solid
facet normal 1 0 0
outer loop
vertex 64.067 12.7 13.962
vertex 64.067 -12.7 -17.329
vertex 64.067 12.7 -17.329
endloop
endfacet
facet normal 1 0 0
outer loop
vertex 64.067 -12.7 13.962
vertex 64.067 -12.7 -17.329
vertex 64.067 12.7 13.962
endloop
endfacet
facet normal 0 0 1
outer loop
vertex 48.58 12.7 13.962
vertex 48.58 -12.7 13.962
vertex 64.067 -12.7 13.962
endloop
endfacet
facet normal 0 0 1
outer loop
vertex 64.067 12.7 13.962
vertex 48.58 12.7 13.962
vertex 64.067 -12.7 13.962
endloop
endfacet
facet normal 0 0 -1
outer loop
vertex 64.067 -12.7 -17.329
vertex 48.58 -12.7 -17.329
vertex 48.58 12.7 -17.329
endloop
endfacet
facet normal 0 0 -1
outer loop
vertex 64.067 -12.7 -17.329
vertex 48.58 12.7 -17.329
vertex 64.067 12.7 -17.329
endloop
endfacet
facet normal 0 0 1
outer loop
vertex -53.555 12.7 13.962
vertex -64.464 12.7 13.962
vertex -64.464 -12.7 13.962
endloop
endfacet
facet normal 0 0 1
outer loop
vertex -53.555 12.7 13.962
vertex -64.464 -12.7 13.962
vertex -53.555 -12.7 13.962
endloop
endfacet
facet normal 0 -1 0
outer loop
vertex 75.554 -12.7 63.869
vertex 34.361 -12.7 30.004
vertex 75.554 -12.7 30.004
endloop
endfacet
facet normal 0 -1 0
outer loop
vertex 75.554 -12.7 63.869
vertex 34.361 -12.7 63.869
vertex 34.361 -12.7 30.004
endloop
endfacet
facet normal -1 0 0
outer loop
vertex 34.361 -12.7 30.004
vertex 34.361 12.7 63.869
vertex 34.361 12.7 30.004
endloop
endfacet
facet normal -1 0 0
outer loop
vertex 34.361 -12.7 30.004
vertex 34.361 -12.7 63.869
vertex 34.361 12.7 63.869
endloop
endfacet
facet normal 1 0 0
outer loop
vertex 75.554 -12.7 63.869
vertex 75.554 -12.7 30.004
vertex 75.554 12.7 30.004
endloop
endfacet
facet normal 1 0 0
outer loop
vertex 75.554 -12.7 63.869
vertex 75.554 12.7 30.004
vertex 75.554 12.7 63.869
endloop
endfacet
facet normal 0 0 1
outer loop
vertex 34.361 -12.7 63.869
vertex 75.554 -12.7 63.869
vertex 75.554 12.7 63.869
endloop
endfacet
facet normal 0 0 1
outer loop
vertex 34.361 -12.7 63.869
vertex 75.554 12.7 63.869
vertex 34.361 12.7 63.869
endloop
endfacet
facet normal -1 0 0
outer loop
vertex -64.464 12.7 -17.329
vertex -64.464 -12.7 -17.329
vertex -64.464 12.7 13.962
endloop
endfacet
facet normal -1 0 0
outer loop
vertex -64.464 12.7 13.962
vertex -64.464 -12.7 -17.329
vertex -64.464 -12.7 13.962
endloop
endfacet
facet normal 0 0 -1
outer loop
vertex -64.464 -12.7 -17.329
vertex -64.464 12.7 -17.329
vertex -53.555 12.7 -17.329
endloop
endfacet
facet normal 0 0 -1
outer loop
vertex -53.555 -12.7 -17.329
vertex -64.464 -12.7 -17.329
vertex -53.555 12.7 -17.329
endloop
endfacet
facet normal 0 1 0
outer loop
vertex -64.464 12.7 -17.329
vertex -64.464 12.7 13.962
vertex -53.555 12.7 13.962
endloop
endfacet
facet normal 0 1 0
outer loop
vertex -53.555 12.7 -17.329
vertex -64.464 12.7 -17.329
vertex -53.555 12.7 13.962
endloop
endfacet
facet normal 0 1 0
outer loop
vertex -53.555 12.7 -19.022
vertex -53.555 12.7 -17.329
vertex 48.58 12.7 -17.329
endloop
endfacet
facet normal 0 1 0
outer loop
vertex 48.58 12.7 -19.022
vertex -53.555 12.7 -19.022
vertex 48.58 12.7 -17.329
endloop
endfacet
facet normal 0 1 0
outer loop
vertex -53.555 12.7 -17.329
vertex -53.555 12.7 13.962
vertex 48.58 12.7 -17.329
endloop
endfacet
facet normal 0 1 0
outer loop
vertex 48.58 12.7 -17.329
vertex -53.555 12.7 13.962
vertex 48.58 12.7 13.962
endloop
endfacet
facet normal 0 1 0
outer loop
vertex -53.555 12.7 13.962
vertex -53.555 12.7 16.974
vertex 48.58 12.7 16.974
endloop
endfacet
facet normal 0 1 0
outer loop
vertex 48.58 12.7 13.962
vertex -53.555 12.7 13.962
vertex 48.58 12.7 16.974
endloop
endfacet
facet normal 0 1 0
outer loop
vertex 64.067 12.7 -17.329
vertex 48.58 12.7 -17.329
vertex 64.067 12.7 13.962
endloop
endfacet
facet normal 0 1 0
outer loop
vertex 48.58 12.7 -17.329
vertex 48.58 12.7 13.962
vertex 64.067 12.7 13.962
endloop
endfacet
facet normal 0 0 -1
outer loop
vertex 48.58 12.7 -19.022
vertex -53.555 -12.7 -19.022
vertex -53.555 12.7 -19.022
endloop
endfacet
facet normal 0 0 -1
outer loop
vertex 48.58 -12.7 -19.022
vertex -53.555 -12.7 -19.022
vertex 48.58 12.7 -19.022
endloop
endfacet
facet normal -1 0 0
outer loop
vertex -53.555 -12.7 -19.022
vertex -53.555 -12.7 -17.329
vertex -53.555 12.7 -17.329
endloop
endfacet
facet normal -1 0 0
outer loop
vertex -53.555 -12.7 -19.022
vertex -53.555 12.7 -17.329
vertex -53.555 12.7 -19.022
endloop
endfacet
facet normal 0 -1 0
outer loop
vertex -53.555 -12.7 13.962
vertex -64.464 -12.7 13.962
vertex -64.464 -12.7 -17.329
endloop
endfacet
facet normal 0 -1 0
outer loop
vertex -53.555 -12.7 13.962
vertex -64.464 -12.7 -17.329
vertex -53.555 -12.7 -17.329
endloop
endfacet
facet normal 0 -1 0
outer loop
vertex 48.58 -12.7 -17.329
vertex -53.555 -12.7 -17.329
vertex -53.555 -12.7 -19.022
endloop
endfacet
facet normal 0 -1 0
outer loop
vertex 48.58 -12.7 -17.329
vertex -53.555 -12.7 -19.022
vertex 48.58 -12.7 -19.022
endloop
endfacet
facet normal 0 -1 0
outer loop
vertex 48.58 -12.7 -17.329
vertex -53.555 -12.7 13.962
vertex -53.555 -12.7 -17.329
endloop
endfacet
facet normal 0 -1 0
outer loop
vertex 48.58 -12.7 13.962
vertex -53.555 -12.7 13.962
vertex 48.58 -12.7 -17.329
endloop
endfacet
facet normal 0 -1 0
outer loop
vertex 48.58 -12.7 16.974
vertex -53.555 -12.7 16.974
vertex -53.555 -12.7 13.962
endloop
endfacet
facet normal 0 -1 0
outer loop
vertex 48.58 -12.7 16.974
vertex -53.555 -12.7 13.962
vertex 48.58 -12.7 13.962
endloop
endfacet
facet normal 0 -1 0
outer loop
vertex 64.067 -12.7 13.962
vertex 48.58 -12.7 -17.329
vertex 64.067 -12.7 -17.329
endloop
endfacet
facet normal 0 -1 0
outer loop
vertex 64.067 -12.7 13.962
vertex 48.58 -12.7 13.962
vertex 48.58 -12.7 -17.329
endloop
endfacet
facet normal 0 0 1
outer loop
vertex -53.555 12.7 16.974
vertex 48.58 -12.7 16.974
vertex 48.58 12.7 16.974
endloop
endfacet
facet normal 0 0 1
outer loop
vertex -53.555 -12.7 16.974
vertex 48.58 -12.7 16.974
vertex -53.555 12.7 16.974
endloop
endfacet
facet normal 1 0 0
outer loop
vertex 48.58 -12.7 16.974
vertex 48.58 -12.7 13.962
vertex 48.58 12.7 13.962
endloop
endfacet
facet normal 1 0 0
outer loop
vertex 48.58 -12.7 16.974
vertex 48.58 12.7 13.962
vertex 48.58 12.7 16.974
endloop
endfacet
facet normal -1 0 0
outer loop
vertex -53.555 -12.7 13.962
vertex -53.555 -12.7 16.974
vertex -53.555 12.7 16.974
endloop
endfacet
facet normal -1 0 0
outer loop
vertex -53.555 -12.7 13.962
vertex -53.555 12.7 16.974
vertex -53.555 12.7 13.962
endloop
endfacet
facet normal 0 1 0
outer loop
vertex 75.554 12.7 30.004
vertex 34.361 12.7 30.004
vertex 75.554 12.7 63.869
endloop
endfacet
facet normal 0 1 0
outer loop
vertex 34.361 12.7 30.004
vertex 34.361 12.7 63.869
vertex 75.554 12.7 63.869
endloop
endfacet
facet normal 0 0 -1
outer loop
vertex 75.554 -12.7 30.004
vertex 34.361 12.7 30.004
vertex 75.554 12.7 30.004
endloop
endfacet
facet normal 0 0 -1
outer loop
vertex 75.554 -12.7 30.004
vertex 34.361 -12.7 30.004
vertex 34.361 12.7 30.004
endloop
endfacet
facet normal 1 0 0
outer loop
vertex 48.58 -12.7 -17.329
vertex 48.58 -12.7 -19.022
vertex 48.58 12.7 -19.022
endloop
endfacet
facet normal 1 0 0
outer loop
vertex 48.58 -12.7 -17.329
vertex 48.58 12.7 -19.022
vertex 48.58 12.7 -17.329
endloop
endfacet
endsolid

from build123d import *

# Parameters (mm, degrees)
F5_DEPTH = 12.7
F7_DEPTH = 12.7
F2_W     = 128.5309195518
F2_H     = 31.2910405919


# Not quite as in the source:
# - the program builds the solid bodies; features that only make, move or delete a surface that nothing else refers to are left out


with BuildPart() as f5:
    # F3 (on Front) → F5 (new body, symmetric)
    with BuildSketch(Plane.XZ):
        Polygon((35.4110151529, 16.973875463), (-53.555496037, 16.973875463), (-53.555496037, -19.0224424005), (48.5804006457, -19.0224424005), (48.5804006457, 16.973875463), align=None)
    extrude(amount=F5_DEPTH, both=True)

    # F2 (on Front) → F7, piece 2 (join, symmetric)
    with BuildSketch(Plane.XZ):
        with Locations((-0.1980438828, -1.6833790578)):
            Rectangle(F2_W, F2_H)
    extrude(amount=F7_DEPTH, both=True)


with BuildPart() as f7:
    # F2 (on Front) → F7 (new body, symmetric)
    with BuildSketch(Plane.XZ):
        Polygon((34.3607328832, 30.0037506968), (64.0674158931, 30.0037506968), (75.5539983511, 30.0037506968), (75.5539983511, 63.8693645597), (34.3607328832, 63.8693645597), align=None)
    extrude(amount=F7_DEPTH, both=True)


solid = Compound([f5.part, f7.part])
